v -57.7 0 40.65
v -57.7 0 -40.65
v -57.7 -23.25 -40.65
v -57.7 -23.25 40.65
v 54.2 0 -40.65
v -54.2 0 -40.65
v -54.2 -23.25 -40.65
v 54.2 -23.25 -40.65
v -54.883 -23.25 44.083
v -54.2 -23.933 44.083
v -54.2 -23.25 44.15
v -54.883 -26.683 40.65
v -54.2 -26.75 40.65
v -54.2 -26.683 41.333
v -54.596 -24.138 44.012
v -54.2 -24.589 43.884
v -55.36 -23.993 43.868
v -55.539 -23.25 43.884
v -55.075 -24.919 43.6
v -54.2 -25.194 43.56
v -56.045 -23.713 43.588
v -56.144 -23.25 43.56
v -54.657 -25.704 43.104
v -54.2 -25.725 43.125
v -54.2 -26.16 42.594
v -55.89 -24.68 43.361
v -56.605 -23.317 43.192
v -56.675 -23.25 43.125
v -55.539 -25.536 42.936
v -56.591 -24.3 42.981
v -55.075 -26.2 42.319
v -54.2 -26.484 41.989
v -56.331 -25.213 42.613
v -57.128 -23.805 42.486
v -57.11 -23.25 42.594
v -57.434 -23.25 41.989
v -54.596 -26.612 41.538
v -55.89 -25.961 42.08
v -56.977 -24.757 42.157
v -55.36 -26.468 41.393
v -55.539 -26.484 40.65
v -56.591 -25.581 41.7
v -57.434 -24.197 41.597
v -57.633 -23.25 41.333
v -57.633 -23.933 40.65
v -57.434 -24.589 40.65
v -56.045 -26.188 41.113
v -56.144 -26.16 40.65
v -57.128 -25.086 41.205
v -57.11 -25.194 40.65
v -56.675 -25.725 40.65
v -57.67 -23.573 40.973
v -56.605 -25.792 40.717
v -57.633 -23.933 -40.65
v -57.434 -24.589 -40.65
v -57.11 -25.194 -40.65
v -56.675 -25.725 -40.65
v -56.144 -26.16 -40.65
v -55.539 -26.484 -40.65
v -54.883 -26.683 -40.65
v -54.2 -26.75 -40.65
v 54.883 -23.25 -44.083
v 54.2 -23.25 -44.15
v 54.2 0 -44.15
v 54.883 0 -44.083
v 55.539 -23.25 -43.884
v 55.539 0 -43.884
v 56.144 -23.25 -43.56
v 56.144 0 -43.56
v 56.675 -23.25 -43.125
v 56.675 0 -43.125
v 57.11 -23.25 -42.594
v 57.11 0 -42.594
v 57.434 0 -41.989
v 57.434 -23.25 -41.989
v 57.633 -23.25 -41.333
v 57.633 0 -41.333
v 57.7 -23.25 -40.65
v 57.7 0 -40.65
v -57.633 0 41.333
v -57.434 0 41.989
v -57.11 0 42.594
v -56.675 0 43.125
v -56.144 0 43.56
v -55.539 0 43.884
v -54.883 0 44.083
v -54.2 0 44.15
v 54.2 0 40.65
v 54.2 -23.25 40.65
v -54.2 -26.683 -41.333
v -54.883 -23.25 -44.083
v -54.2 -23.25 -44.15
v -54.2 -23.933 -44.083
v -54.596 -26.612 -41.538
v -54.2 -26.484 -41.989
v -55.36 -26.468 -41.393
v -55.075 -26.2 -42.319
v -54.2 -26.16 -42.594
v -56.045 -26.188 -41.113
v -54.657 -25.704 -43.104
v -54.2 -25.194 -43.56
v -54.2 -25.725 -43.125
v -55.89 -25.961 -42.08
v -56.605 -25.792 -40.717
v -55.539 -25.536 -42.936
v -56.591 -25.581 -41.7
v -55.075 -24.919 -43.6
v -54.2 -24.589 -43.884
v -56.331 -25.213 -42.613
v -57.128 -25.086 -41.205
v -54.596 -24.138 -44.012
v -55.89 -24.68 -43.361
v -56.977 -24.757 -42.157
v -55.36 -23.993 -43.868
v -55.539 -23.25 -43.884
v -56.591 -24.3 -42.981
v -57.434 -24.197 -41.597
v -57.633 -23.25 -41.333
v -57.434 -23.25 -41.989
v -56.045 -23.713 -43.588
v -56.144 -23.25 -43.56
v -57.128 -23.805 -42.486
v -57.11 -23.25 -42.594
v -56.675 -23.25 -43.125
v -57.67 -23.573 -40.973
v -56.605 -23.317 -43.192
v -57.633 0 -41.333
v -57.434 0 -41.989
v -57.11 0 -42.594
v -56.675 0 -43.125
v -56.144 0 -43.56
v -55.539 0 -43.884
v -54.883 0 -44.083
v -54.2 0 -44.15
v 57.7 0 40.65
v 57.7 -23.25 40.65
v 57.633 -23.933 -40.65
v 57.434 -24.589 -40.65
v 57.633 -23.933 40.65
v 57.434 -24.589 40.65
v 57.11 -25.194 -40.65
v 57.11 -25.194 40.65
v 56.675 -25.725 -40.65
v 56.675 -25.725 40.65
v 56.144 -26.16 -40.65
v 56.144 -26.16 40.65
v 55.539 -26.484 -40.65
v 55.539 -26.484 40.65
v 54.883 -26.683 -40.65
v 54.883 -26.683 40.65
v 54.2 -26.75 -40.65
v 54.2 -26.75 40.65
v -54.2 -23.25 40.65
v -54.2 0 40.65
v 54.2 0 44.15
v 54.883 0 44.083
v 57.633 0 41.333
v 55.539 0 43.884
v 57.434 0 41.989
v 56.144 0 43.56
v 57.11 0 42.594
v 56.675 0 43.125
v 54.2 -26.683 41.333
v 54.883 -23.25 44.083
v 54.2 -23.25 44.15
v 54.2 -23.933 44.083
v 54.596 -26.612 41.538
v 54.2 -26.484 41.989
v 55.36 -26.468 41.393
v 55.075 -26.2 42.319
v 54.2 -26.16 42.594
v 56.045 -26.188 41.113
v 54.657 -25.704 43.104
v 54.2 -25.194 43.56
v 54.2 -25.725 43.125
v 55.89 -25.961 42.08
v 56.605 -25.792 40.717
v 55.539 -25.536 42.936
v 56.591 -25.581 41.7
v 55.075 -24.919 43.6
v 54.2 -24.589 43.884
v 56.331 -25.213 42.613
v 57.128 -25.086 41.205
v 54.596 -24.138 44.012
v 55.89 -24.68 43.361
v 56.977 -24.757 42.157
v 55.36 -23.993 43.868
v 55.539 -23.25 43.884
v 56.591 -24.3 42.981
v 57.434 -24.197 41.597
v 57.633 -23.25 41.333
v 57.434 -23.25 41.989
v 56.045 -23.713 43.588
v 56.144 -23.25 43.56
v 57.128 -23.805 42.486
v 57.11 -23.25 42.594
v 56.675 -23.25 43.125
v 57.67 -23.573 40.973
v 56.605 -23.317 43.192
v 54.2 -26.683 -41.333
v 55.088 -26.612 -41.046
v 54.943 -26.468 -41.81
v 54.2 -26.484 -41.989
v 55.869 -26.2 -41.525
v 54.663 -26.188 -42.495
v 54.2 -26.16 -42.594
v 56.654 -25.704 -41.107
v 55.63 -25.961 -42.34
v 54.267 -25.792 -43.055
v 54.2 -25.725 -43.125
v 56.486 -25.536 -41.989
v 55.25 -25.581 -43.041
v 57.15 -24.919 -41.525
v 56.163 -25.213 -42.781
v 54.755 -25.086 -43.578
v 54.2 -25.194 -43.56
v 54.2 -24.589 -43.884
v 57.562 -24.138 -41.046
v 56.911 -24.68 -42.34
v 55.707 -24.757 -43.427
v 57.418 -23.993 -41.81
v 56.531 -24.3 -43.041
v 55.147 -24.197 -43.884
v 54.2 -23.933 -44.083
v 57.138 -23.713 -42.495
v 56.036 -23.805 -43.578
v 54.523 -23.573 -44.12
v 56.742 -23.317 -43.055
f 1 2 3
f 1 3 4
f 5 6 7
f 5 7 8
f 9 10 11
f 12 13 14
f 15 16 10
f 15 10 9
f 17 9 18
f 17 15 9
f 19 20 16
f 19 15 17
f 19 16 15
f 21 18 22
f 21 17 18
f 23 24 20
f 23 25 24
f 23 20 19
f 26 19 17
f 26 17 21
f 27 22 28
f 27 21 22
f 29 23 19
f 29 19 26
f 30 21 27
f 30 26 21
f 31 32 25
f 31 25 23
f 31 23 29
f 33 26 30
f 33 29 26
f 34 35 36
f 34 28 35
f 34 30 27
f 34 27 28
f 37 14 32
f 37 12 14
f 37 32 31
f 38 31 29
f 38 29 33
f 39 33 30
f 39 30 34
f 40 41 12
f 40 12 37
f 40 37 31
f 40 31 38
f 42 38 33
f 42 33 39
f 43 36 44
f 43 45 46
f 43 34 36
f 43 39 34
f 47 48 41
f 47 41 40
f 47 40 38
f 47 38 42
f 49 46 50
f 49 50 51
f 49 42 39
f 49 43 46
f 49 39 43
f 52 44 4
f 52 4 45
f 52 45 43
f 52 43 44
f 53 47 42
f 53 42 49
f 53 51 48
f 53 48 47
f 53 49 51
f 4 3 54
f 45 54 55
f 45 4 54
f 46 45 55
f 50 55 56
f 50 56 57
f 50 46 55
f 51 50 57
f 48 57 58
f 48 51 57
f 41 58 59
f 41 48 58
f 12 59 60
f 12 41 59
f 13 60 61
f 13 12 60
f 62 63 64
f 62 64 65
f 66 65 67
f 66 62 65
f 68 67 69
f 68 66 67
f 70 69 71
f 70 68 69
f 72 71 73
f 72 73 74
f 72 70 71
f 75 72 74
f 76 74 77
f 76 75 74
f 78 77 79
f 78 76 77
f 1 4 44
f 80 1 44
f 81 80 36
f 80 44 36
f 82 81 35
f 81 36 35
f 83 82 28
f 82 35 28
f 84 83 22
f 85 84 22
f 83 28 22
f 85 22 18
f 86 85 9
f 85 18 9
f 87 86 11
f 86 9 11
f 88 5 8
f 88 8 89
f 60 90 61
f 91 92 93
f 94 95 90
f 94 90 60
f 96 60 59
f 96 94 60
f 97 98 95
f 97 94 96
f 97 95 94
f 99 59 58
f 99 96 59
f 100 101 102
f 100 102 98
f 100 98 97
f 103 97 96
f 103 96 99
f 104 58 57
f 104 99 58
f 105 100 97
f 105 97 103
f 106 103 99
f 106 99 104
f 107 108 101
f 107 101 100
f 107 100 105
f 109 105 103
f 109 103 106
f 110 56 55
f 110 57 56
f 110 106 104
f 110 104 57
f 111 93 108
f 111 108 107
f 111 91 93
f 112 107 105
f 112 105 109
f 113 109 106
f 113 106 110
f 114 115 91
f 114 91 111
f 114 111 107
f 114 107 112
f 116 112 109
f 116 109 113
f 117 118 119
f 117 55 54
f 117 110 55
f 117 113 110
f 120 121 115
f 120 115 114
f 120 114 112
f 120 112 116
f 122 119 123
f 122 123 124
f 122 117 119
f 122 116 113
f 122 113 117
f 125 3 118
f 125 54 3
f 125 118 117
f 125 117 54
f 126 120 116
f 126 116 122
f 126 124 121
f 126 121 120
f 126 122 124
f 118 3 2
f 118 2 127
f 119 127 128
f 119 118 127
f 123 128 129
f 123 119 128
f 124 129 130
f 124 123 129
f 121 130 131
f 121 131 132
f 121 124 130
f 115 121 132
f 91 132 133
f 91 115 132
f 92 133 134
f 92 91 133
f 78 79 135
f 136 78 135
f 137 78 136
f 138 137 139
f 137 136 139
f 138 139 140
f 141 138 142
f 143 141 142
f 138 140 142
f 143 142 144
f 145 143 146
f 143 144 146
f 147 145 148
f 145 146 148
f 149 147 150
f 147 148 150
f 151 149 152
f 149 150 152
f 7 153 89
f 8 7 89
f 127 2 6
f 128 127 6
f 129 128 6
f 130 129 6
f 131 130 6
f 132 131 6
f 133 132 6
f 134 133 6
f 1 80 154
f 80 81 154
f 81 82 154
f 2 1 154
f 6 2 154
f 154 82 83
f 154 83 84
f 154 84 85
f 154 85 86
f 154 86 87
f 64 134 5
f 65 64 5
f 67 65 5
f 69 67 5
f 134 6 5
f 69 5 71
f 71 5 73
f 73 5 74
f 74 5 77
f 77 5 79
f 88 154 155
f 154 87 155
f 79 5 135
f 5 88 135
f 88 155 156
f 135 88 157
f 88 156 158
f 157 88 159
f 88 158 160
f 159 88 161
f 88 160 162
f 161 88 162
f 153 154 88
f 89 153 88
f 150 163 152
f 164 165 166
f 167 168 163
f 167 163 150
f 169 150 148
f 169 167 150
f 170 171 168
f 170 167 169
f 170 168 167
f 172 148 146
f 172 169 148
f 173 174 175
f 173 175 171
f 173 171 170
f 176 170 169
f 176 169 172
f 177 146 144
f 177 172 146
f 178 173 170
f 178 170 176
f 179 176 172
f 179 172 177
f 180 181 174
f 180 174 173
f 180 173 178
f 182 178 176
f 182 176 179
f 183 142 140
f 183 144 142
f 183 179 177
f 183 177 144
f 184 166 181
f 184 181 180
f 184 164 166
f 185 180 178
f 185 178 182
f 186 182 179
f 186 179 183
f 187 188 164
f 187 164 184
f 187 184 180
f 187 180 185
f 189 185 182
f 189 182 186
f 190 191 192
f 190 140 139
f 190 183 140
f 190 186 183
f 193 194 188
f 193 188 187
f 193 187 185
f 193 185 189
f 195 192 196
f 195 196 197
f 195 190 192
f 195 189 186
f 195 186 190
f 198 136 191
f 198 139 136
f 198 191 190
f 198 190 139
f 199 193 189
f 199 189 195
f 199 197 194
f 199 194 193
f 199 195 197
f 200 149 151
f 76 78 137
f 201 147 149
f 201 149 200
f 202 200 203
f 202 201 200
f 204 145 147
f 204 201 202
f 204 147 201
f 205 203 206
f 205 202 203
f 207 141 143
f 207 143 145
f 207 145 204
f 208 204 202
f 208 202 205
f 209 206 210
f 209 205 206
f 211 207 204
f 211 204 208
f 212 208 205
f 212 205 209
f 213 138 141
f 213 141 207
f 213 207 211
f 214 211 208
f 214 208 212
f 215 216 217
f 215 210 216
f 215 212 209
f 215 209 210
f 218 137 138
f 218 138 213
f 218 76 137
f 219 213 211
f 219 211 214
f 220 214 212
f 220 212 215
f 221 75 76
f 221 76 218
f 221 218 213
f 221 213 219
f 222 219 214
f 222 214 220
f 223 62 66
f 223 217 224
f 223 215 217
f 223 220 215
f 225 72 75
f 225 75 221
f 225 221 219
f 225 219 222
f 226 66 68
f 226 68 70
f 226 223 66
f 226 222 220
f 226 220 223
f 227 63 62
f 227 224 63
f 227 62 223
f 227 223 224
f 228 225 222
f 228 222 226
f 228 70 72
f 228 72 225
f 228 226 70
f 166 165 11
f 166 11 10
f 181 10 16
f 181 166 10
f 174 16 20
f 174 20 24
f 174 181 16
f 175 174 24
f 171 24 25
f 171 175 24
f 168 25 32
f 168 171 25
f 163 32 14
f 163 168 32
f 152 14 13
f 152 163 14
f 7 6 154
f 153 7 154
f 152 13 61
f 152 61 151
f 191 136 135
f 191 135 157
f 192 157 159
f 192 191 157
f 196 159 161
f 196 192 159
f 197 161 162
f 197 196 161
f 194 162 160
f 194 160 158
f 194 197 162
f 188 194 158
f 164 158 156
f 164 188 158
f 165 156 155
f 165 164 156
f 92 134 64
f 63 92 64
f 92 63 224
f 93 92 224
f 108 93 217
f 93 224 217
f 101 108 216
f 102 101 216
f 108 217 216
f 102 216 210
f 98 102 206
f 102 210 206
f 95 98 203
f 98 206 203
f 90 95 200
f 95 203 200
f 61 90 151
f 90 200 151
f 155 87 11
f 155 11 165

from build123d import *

# Parameters (mm, degrees)
SKETCH_W    = 108.4
SKETCH_H    = 81.3
PAD_DEPTH   = 23.25
THICKNESS_T = 3.5


with BuildPart() as part:
    # Sketch → Pad (new body)
    with BuildSketch(Plane.XZ):
        Rectangle(SKETCH_W, SKETCH_H)
    extrude(amount=PAD_DEPTH)

    # Thickness
    thickness_openings = [part.faces().sort_by_distance(p)[0] for p in [
        (0, 0, 0),
    ]]
    offset(amount=THICKNESS_T, openings=thickness_openings)


solid = part.part
